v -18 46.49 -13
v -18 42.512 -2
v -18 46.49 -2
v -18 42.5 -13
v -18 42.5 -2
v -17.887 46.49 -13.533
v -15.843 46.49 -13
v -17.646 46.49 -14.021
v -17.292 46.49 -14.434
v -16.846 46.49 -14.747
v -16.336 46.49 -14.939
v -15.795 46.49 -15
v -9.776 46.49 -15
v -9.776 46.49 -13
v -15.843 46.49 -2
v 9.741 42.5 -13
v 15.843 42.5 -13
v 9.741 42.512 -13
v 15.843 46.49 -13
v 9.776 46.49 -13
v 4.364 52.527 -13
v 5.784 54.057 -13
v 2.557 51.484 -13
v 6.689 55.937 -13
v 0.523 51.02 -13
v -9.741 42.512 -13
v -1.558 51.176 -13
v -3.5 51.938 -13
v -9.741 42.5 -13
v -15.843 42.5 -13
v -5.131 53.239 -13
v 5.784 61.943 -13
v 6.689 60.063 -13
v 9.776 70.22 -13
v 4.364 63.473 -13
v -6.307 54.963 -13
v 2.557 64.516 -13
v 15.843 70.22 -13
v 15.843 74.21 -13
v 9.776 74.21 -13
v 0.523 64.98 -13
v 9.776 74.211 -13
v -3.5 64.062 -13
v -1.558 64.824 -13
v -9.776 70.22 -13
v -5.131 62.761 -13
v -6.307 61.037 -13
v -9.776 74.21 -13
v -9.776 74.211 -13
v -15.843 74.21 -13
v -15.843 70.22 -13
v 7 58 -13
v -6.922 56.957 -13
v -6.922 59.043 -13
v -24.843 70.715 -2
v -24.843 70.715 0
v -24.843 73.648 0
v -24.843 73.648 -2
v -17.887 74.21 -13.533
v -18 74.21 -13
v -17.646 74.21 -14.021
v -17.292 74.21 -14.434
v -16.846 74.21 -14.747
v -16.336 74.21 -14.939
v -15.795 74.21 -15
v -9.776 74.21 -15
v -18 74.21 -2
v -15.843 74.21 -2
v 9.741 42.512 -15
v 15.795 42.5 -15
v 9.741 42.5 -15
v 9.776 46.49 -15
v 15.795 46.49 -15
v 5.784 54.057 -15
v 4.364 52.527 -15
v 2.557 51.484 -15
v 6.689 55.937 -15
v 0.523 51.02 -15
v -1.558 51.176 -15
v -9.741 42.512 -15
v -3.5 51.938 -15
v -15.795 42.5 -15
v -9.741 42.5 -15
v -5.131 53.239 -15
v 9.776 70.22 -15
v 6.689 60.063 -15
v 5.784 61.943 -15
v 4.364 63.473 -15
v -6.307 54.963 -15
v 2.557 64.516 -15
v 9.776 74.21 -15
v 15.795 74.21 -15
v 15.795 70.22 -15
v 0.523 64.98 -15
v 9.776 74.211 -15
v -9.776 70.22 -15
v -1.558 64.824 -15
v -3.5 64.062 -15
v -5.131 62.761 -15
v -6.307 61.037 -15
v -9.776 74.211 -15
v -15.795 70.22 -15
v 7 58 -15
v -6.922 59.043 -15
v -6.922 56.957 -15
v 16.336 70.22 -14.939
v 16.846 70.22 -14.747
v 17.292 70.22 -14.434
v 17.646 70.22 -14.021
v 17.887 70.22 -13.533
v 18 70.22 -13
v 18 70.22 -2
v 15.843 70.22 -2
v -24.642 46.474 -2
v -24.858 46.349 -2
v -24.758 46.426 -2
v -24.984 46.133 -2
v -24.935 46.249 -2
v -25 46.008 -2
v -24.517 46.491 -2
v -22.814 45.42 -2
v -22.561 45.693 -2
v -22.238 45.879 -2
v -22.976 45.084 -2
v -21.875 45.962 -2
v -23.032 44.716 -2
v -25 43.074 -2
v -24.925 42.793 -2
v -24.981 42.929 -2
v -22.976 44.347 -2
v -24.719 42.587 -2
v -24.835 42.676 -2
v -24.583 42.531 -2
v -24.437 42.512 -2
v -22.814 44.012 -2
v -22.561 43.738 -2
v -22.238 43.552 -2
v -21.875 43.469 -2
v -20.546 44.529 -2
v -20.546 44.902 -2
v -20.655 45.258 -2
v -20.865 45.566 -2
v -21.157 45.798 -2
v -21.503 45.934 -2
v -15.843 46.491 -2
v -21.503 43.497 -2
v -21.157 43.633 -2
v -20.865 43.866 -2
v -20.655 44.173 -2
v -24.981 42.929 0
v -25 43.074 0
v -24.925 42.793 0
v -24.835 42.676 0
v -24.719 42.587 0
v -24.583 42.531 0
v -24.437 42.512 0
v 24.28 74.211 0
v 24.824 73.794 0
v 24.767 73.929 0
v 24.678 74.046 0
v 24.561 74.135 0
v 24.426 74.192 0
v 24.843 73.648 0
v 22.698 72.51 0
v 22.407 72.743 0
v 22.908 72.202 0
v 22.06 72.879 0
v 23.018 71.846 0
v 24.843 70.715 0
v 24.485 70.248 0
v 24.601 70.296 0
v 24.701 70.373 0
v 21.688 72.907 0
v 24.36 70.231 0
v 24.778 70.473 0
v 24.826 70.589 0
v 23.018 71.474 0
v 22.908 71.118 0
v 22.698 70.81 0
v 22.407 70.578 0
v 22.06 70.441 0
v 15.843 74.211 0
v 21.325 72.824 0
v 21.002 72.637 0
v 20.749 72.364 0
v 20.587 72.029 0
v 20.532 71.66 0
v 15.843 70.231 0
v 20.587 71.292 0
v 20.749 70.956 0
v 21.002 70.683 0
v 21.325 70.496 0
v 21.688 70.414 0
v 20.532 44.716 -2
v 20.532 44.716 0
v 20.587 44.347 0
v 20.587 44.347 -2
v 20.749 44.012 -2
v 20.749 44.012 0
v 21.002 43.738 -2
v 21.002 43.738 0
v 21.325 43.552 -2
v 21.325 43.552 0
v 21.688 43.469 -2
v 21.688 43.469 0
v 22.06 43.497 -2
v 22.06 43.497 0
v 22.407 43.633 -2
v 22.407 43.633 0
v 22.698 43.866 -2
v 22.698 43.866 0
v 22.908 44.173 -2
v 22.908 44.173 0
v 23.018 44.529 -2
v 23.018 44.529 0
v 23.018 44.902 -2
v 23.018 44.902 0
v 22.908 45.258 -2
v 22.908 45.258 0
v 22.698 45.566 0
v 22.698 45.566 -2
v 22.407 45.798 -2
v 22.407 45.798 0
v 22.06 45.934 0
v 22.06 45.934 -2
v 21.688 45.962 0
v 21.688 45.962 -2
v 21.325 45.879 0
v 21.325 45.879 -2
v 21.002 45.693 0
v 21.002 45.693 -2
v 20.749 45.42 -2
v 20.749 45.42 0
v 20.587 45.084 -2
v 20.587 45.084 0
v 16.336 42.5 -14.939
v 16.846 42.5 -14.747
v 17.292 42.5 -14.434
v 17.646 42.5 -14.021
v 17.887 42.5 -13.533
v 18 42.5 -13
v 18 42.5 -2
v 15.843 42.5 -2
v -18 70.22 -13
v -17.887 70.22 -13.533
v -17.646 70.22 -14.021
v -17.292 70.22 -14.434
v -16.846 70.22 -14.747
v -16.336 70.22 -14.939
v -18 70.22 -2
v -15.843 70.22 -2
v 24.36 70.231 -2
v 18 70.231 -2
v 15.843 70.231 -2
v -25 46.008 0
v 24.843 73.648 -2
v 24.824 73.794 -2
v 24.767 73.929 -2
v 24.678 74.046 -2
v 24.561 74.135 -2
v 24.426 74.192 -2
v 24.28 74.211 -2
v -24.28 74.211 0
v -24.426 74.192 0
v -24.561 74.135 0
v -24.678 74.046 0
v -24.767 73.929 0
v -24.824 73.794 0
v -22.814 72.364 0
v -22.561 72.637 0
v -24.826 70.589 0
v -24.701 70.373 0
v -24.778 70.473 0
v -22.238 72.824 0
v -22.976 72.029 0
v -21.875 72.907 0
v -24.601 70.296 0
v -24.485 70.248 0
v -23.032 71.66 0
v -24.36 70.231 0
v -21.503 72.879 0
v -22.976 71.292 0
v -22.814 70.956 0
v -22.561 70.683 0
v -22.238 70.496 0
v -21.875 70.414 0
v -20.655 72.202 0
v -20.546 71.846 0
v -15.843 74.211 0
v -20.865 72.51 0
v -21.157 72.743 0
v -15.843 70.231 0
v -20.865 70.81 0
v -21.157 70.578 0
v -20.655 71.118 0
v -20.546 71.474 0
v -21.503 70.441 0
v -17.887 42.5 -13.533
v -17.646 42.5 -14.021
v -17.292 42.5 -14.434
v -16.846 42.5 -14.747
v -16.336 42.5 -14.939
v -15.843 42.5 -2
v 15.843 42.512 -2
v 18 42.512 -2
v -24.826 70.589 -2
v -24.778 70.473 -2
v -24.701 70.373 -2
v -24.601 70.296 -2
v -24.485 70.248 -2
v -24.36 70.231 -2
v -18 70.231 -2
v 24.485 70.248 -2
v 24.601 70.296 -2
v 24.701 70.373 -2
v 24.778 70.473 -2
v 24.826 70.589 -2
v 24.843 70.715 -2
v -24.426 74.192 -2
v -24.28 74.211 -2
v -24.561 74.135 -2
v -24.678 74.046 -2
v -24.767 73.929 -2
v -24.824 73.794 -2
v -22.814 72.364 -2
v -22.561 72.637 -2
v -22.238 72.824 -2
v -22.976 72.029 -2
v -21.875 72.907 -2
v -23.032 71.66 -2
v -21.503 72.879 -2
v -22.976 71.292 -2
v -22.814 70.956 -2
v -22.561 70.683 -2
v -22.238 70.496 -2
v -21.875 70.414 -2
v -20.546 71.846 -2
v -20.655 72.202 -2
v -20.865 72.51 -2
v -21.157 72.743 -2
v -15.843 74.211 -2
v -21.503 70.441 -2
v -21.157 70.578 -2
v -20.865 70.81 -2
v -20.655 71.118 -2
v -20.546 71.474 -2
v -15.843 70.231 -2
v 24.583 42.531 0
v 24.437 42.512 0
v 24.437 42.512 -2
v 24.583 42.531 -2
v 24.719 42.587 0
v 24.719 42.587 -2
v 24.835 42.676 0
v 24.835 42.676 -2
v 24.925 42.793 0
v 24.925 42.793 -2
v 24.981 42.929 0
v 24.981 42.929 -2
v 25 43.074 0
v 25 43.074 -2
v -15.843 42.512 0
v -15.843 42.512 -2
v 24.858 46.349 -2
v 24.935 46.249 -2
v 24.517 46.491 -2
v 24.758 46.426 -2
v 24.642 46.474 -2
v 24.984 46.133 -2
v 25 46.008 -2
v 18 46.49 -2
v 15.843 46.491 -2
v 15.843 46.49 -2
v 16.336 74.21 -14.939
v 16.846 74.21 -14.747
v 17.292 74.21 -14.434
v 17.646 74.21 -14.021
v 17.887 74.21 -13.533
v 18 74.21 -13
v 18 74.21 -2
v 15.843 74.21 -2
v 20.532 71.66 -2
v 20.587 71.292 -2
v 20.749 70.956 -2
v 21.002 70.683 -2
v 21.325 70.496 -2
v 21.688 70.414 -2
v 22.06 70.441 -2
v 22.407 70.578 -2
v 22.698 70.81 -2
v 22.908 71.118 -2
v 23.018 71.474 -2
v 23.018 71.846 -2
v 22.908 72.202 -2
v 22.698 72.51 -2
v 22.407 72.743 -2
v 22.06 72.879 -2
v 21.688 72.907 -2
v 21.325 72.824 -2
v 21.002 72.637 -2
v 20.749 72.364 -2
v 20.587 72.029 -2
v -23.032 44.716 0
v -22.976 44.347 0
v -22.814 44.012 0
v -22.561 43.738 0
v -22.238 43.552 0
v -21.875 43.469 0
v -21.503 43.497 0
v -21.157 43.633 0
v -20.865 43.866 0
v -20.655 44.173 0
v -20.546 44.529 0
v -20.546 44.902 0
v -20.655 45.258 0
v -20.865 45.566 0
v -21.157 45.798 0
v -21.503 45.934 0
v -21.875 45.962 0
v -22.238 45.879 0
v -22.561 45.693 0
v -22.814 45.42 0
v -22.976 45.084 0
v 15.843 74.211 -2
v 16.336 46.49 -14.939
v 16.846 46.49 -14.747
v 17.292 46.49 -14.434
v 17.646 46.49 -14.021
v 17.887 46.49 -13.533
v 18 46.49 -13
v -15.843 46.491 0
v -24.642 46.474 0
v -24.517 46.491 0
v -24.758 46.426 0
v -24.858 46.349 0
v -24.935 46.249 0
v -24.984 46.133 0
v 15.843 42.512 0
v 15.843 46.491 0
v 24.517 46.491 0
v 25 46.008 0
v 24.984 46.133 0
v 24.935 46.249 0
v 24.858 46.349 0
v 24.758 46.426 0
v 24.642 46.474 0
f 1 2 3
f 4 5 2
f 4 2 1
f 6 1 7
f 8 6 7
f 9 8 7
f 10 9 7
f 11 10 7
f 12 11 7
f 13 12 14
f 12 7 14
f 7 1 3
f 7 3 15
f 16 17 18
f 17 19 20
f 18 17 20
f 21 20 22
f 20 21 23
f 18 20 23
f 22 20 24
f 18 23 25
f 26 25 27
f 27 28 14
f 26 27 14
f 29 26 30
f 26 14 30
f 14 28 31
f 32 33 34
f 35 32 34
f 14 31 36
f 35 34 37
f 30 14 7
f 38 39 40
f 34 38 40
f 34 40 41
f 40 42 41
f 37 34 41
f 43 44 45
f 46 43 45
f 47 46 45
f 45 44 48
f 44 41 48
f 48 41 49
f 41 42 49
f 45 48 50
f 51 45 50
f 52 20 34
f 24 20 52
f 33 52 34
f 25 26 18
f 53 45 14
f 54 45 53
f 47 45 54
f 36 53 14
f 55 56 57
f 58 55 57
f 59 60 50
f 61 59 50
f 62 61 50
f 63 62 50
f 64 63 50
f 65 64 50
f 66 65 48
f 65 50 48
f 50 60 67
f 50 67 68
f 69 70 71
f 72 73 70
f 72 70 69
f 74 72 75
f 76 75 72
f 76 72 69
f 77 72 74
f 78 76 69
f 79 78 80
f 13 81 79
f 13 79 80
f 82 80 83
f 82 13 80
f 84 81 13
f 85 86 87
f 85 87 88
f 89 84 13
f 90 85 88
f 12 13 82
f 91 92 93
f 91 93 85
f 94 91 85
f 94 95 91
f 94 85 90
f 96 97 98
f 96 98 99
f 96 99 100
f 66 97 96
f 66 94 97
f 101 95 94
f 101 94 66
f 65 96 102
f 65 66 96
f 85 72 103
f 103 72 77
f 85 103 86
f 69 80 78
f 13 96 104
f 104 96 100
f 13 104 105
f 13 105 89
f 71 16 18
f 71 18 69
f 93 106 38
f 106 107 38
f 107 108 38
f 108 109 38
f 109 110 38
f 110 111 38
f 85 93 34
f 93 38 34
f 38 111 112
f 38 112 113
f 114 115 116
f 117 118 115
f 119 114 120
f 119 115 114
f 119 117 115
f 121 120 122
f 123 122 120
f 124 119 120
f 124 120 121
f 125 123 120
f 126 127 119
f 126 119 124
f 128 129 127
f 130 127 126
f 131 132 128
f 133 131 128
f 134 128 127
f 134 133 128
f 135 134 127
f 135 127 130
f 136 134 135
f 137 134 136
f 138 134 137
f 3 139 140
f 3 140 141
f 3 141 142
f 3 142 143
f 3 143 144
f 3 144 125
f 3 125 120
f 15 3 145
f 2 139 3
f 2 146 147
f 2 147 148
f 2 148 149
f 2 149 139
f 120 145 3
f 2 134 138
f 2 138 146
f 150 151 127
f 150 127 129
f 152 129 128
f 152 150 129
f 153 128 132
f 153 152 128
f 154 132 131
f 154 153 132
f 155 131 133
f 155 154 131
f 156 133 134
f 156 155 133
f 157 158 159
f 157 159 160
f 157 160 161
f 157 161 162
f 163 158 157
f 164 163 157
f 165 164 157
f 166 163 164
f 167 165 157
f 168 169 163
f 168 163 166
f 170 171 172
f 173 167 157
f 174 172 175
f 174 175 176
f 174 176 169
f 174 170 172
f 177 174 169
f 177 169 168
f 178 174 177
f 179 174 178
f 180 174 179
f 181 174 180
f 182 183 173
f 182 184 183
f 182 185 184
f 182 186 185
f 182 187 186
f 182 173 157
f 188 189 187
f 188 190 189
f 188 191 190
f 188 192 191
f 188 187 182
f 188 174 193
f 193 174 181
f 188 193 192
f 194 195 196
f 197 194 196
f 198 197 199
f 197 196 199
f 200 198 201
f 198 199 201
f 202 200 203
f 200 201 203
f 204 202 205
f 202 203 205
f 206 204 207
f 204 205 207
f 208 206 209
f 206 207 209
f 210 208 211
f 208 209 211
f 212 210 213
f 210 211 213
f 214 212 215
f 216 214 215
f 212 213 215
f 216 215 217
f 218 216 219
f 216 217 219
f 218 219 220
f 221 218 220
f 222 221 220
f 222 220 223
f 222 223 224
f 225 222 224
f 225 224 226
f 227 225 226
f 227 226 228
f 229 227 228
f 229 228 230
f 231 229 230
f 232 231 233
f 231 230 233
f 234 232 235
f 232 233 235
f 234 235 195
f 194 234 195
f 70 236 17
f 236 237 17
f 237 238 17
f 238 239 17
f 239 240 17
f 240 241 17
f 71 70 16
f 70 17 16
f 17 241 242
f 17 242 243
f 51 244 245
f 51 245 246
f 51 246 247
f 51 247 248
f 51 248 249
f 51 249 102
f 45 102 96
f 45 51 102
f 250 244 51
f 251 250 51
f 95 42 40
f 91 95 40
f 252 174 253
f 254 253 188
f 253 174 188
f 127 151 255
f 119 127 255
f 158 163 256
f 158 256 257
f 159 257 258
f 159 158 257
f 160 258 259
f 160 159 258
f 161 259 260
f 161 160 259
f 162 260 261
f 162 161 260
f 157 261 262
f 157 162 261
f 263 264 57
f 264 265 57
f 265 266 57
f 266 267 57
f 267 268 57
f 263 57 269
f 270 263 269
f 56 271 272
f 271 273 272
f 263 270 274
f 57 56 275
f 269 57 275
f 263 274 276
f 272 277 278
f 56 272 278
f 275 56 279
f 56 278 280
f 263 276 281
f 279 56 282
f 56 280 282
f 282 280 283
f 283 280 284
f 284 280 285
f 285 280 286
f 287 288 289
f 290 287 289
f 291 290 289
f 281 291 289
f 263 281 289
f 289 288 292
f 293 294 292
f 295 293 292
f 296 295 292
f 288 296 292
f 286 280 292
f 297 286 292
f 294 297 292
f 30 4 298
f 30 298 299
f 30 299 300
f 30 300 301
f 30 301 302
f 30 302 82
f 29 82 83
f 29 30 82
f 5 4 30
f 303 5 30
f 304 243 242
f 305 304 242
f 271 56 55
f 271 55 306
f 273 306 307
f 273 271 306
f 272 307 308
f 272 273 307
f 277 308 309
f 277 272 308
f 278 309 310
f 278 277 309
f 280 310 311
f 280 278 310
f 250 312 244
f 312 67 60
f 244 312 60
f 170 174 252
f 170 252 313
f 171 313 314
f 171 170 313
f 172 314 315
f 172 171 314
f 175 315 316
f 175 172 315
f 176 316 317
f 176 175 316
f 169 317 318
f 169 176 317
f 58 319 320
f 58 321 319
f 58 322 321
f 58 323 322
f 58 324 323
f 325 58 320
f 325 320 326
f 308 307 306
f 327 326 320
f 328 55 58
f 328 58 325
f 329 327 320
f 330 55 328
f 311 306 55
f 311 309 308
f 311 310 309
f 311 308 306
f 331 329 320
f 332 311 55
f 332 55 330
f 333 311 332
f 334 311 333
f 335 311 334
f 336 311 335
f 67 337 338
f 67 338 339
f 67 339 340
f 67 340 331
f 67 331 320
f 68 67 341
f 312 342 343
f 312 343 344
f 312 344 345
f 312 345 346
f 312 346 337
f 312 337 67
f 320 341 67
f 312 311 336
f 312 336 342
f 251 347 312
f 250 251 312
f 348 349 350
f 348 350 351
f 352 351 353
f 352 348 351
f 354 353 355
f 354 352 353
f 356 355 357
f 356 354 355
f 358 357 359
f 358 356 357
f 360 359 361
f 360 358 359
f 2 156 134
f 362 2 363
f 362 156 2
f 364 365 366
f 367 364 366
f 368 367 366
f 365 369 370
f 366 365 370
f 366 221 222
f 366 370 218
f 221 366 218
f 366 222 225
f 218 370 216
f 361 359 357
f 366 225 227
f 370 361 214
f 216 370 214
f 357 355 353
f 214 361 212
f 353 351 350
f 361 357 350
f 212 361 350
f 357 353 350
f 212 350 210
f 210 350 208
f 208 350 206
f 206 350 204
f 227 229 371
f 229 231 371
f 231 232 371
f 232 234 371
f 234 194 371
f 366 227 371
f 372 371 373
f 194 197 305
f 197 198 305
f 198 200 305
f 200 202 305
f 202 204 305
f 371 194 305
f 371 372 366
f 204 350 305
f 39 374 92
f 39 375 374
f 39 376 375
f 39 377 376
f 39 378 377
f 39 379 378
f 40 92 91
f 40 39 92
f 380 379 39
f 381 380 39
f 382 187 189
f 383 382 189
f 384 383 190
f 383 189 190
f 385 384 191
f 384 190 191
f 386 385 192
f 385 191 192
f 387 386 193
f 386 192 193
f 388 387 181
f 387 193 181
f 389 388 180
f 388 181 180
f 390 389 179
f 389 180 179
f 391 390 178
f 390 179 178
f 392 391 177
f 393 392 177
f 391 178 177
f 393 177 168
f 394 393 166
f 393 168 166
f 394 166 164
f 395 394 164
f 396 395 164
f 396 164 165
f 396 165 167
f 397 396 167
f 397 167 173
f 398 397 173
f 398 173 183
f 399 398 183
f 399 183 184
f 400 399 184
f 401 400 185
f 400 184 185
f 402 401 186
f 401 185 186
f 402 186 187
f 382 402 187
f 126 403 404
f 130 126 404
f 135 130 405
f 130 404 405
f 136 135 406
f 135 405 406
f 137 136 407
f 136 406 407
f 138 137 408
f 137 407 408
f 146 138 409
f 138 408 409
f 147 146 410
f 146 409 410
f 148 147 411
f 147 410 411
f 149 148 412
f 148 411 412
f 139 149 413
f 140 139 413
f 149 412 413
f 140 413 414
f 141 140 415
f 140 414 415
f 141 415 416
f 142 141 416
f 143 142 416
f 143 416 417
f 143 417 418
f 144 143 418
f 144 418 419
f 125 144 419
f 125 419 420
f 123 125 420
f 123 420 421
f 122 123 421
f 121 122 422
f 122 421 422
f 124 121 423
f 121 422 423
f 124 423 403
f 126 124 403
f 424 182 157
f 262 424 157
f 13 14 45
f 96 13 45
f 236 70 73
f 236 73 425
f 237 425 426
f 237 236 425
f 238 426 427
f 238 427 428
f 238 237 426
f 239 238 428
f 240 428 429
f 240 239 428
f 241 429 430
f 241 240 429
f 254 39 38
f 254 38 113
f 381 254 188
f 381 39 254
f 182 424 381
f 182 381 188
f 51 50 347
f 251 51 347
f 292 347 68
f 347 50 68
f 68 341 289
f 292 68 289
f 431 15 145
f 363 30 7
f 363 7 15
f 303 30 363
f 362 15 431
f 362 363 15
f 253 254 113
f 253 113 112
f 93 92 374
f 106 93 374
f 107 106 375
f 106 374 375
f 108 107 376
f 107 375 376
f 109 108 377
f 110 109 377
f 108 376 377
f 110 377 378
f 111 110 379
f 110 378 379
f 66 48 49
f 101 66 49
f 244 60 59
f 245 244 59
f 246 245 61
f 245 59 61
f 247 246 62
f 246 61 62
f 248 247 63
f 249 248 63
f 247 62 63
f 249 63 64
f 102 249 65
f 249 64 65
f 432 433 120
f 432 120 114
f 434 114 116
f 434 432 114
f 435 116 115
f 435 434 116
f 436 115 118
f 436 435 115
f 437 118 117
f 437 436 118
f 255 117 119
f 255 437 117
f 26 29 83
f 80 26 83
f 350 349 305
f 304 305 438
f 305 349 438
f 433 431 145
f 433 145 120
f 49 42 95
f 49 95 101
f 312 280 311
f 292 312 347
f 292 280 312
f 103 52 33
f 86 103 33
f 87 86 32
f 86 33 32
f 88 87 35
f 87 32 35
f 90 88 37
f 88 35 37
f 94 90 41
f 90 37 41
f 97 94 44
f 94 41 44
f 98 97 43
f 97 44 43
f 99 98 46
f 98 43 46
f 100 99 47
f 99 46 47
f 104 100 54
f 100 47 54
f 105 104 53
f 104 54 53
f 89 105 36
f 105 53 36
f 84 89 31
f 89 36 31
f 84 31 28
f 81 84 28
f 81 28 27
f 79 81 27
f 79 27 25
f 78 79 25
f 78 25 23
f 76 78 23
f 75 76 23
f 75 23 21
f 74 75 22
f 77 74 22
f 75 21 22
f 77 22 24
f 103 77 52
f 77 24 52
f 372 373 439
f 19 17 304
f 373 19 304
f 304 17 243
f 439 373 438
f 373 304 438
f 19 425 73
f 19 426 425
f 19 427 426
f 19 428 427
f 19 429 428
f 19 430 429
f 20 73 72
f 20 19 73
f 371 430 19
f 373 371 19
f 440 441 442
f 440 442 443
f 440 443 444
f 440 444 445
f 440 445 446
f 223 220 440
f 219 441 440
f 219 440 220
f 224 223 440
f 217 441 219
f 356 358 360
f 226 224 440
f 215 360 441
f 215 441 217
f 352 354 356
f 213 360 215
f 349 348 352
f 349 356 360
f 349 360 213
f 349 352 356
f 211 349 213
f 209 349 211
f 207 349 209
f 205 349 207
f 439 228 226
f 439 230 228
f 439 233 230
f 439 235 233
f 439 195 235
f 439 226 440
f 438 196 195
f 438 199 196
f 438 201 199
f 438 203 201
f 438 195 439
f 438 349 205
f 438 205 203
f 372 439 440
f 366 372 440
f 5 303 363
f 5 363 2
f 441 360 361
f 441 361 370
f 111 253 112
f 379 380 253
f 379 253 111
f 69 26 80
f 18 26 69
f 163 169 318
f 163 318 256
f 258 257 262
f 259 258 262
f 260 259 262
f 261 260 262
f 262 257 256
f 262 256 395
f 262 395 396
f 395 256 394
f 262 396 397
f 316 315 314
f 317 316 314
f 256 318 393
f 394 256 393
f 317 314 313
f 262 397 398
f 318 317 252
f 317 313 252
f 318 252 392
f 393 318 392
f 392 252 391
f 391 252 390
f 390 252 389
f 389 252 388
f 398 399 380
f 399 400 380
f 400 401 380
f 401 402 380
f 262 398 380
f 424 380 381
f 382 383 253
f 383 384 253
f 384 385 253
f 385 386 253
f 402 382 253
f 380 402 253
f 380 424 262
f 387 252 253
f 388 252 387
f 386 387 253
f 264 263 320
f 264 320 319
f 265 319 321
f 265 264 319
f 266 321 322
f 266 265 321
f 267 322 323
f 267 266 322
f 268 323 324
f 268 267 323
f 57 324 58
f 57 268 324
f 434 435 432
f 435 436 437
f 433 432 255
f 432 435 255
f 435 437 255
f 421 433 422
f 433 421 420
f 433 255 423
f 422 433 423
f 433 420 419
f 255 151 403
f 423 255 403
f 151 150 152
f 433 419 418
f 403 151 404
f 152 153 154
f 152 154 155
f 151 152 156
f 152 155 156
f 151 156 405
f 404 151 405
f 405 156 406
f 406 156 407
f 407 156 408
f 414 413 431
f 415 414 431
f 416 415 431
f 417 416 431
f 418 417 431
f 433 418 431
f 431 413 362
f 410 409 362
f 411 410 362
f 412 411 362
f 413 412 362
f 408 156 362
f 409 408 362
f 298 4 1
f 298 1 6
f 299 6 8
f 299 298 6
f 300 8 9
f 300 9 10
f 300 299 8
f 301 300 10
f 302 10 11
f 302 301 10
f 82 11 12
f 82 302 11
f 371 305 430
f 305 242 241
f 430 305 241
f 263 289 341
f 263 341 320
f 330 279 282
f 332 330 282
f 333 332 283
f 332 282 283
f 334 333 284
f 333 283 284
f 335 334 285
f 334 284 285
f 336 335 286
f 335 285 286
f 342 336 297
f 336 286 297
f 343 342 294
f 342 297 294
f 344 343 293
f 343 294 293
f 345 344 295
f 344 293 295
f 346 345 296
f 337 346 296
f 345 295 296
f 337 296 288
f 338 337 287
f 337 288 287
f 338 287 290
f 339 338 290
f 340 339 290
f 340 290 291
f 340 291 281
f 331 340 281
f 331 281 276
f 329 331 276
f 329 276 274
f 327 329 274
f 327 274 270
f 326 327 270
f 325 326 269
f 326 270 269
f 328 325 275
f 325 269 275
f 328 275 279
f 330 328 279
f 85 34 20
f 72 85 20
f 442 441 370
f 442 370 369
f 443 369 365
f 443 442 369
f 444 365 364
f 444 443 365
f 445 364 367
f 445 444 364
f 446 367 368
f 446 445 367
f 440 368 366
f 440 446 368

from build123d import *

# Parameters (mm, degrees)
SKETCH076_R  = 7
PAD046_DEPTH = 2
PAD047_DEPTH = 3.99
PAD048_DEPTH = 3.99
SKETCH_R     = 1.25
PAD_DEPTH    = 2


with BuildPart() as pad046:
    # Sketch076 → Pad046 (new body)
    with BuildSketch(Plane.XY.offset(-13)):
        Polygon((-9.775637, 74.2107), (0, 74.2107), (9.775637, 74.2107), (9.775637, 42.511509), (0, 42.511509), (-9.775637, 42.511509), align=None)
        with Locations((0, 58)):
            Circle(SKETCH076_R, mode=Mode.SUBTRACT)
    extrude(amount=-PAD046_DEPTH)


with BuildPart() as pad047:
    # Sketch077 → Pad047 (new body)
    with BuildSketch(Plane.XZ.offset(-42.5)):
        with BuildLine():
            Line((-15.842702, -2), (-18, -2))
            Line((-18, -2), (-18, -13.000001))
            ThreePointArc((-18, -13.000001), (-17.291527, -14.434217), (-15.795265, -15))
            Line((-15.795265, -15), (-9.741142, -15))
            Line((-9.741142, -13), (-9.741142, -15))
            Line((-15.842702, -13), (-9.741142, -13))
            Line((-15.842702, -13), (-15.842702, -2))
        make_face()
        with BuildLine():
            Line((15.842702, -2), (18, -2))
            Line((18, -2), (18, -13.000001))
            ThreePointArc((15.795265, -15), (17.291527, -14.434217), (18, -13.000001))
            Line((15.795265, -15), (9.741142, -15))
            Line((9.741142, -13), (9.741142, -15))
            Line((15.842702, -13), (9.741142, -13))
            Line((15.842702, -13), (15.842702, -2))
        make_face()
    extrude(amount=-PAD047_DEPTH)


with BuildPart() as pad048:
    # Sketch078 → Pad048 (new body)
    with BuildSketch(Plane.XZ.offset(-74.21)):
        with BuildLine():
            Line((-15.842702, -2), (-18, -2))
            Line((-18, -2), (-18, -13.000001))
            ThreePointArc((-18, -13.000001), (-17.291527, -14.434217), (-15.795265, -15))
            Line((-15.795265, -15), (-9.741142, -15))
            Line((-9.741142, -13), (-9.741142, -15))
            Line((-15.842702, -13), (-9.741142, -13))
            Line((-15.842702, -13), (-15.842702, -2))
        make_face()
        with BuildLine():
            Line((15.842702, -2), (18, -2))
            Line((18, -2), (18, -13.000001))
            ThreePointArc((15.795265, -15), (17.291527, -14.434217), (18, -13.000001))
            Line((15.795265, -15), (9.741142, -15))
            Line((9.741142, -13), (9.741142, -15))
            Line((15.842702, -13), (9.741142, -13))
            Line((15.842702, -13), (15.842702, -2))
        make_face()
    extrude(amount=PAD048_DEPTH)


with BuildPart() as battery_holder001:
    # Sketch → Pad (new body)
    with BuildSketch(Plane(origin=(0, 0, 0), x_dir=(-1, 0, 0), z_dir=(0, 0, 1))):
        with BuildLine():
            Line((-25, -43.074277), (-25, -46.007702))
            ThreePointArc((-25, -46.007702), (-24.85848, -46.349363), (-24.516819, -46.490883))
            Line((-15.842702, -46.490883), (-24.516819, -46.490883))
            Line((-15.842702, -42.511509), (-15.842702, -46.490883))
            Line((-24.437232, -42.511509), (-15.842702, -42.511509))
            ThreePointArc((-24.437232, -42.511509), (-24.835169, -42.67634), (-25, -43.074277))
        make_face()
        with Locations((-21.781596, -44.715717)):
            Circle(SKETCH_R, mode=Mode.SUBTRACT)
        with BuildLine():
            Line((-24.842702, -70.71451), (-24.842702, -73.647932))
            ThreePointArc((-24.842702, -73.647932), (-24.677871, -74.045869), (-24.279934, -74.2107))
            Line((-15.842702, -74.2107), (-24.279934, -74.2107))
            Line((-15.842702, -70.23133), (-15.842702, -74.2107))
            Line((-24.359522, -70.23133), (-15.842702, -70.23133))
            ThreePointArc((-24.359522, -70.23133), (-24.701182, -70.37285), (-24.842702, -70.71451))
        make_face()
        with Locations((-21.781596, -71.660071)):
            Circle(SKETCH_R, mode=Mode.SUBTRACT)
        with BuildLine():
            Line((25, -43.074277), (25, -46.007702))
            ThreePointArc((24.516819, -46.490883), (24.85848, -46.349363), (25, -46.007702))
            Line((15.842702, -46.490883), (24.516819, -46.490883))
            Line((15.842702, -42.511509), (15.842702, -46.490883))
            Line((24.437232, -42.511509), (15.842702, -42.511509))
            ThreePointArc((25, -43.074277), (24.835169, -42.67634), (24.437232, -42.511509))
        make_face()
        with Locations((21.781596, -44.715717)):
            Circle(SKETCH_R, mode=Mode.SUBTRACT)
        with BuildLine():
            Line((24.842702, -70.71451), (24.842702, -73.647932))
            ThreePointArc((24.279934, -74.2107), (24.677871, -74.045869), (24.842702, -73.647932))
            Line((15.842702, -74.2107), (24.279934, -74.2107))
            Line((15.842702, -70.23133), (15.842702, -74.2107))
            Line((24.359522, -70.23133), (15.842702, -70.23133))
            ThreePointArc((24.842702, -70.71451), (24.701182, -70.37285), (24.359522, -70.23133))
        make_face()
        with Locations((21.781596, -71.660071)):
            Circle(SKETCH_R, mode=Mode.SUBTRACT)
    extrude(amount=-PAD_DEPTH)

    # Fusion: union Pad046, Pad047, Pad048
    add(pad046.part)
    add(pad047.part)
    add(pad048.part)


solid = battery_holder001.part
